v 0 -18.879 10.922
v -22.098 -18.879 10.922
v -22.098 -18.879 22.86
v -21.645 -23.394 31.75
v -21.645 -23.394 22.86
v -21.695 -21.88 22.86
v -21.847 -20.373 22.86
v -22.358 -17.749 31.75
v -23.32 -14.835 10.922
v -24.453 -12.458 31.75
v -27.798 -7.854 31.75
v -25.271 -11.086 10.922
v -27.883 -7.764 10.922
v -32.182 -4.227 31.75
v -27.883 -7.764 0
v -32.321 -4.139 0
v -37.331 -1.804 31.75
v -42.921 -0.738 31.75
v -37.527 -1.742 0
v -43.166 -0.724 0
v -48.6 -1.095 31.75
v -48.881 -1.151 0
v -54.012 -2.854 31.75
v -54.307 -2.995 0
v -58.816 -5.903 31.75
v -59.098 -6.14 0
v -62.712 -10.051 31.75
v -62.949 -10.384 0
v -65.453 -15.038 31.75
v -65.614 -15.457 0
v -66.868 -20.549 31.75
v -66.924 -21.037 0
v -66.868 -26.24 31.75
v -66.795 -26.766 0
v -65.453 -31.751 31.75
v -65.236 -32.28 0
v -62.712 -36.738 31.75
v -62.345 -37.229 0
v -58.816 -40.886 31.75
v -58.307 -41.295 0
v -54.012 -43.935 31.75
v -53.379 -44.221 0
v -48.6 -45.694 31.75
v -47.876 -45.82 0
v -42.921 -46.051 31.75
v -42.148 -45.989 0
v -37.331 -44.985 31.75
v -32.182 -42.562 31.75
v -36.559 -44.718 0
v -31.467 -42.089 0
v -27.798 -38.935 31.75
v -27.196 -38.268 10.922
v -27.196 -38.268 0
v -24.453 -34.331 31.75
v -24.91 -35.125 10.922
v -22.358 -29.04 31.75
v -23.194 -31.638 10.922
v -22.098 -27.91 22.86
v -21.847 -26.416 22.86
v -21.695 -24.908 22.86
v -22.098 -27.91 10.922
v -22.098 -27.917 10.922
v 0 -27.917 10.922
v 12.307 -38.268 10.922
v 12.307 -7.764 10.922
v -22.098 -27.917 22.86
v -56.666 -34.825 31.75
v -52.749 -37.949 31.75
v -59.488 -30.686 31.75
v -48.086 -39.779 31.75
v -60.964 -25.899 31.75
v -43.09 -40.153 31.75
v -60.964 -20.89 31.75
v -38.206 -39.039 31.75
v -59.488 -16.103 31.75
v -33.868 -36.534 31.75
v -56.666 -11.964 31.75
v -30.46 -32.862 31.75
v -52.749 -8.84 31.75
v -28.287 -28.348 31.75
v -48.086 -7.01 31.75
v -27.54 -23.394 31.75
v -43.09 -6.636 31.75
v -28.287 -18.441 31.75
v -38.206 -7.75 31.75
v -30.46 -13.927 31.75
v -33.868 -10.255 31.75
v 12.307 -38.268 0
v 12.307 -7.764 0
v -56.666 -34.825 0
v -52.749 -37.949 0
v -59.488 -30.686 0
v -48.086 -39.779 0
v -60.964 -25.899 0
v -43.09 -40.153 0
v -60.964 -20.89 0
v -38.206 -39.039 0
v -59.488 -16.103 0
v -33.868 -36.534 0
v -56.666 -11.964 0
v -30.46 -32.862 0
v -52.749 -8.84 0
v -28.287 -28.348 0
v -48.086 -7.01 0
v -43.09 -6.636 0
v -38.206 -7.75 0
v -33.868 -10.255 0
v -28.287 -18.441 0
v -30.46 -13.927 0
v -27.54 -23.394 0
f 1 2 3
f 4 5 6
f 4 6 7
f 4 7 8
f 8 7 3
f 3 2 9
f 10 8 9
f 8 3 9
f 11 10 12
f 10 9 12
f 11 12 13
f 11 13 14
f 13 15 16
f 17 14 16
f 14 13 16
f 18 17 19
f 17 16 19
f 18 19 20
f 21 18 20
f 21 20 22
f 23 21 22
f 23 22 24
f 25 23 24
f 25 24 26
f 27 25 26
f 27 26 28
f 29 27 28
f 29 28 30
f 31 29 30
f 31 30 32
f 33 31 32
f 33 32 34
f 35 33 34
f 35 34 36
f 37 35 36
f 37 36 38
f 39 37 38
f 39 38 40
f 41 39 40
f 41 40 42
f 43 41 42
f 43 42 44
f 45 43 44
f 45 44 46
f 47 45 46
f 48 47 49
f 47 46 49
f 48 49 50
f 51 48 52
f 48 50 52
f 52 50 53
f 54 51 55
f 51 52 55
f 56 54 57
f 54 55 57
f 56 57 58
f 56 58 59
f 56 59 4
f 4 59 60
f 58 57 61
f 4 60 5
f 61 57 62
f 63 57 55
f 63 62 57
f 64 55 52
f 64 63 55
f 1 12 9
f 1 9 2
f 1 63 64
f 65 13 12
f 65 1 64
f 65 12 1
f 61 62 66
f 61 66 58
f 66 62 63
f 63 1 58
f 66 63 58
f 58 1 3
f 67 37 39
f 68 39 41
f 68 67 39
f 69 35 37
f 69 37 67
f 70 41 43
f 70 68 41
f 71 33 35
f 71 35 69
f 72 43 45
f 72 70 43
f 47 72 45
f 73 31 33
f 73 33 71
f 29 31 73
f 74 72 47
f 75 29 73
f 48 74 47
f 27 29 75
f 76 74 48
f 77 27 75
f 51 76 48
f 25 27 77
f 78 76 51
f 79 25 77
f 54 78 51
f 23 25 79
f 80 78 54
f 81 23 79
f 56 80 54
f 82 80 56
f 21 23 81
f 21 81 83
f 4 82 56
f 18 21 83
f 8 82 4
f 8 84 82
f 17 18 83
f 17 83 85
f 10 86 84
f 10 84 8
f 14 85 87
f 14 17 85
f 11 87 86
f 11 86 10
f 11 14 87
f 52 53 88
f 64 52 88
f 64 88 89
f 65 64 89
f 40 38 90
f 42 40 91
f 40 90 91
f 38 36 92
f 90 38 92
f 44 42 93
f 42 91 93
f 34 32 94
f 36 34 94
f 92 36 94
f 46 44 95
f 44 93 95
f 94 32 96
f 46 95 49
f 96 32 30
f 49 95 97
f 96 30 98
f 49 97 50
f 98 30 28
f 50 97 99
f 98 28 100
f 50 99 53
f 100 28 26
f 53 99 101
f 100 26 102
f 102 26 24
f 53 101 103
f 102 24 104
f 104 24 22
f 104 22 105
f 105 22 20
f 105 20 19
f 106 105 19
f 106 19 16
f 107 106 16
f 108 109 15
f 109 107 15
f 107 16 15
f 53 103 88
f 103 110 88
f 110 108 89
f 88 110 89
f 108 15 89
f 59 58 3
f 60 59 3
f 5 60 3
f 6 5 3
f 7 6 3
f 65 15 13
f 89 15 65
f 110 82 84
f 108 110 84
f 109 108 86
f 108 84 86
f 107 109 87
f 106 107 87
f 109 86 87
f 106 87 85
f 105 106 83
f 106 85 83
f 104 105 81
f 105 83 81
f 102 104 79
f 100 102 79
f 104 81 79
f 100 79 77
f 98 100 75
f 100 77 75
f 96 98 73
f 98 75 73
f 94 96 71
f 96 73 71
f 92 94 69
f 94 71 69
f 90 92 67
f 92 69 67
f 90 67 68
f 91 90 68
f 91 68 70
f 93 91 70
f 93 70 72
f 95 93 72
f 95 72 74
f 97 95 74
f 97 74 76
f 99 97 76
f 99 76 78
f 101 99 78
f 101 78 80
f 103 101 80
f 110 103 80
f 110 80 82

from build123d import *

# Parameters (mm, degrees)
F1_R     = 22.70121
F2_DEPTH = 31.75
F0_W     = 57.163614
F0_H     = 30.503861
F3_DEPTH = 10.922
F4_R     = 16.805864
F5_DEPTH = 45.466
F6_W     = 22.098323
F6_H     = 9.037962
F7_DEPTH = 11.938
F9_DEPTH = 25.4


with BuildPart() as f2:
    # F1 (on face) → F2 (new body)
    with BuildSketch(Plane.XY):
        with Locations((-44.346001, -23.394492)):
            Circle(F1_R)
    extrude(amount=F2_DEPTH)

    # F0 (on Top) → F3 (join)
    with BuildSketch(Plane.XY):
        with Locations((-16.275043, -23.01623)):
            Rectangle(F0_W, F0_H)
    extrude(amount=F3_DEPTH)

    # F4 (on face) → F5 (cut)
    with BuildSketch(Plane.XY.offset(31.75)):
        with Locations((-44.346001, -23.394492)):
            Circle(F4_R)
    extrude(amount=-F5_DEPTH, mode=Mode.SUBTRACT)

    # F6 (on face) → F7 (join)
    with BuildSketch(Plane.XY.offset(10.922)):
        with Locations((-11.049162, -23.398413)):
            Rectangle(F6_W, F6_H)
    extrude(amount=F7_DEPTH)

    # F8 (on face) → F9 (cut)
    with BuildSketch(Plane(origin=(0, -18.879432, 0), x_dir=(-1, 0, 0), z_dir=(0, 1, 0))):
        Polygon((0, 10.922), (22.098323, 22.86), (0, 22.86), align=None)
    extrude(amount=-F9_DEPTH, mode=Mode.SUBTRACT)


solid = f2.part
